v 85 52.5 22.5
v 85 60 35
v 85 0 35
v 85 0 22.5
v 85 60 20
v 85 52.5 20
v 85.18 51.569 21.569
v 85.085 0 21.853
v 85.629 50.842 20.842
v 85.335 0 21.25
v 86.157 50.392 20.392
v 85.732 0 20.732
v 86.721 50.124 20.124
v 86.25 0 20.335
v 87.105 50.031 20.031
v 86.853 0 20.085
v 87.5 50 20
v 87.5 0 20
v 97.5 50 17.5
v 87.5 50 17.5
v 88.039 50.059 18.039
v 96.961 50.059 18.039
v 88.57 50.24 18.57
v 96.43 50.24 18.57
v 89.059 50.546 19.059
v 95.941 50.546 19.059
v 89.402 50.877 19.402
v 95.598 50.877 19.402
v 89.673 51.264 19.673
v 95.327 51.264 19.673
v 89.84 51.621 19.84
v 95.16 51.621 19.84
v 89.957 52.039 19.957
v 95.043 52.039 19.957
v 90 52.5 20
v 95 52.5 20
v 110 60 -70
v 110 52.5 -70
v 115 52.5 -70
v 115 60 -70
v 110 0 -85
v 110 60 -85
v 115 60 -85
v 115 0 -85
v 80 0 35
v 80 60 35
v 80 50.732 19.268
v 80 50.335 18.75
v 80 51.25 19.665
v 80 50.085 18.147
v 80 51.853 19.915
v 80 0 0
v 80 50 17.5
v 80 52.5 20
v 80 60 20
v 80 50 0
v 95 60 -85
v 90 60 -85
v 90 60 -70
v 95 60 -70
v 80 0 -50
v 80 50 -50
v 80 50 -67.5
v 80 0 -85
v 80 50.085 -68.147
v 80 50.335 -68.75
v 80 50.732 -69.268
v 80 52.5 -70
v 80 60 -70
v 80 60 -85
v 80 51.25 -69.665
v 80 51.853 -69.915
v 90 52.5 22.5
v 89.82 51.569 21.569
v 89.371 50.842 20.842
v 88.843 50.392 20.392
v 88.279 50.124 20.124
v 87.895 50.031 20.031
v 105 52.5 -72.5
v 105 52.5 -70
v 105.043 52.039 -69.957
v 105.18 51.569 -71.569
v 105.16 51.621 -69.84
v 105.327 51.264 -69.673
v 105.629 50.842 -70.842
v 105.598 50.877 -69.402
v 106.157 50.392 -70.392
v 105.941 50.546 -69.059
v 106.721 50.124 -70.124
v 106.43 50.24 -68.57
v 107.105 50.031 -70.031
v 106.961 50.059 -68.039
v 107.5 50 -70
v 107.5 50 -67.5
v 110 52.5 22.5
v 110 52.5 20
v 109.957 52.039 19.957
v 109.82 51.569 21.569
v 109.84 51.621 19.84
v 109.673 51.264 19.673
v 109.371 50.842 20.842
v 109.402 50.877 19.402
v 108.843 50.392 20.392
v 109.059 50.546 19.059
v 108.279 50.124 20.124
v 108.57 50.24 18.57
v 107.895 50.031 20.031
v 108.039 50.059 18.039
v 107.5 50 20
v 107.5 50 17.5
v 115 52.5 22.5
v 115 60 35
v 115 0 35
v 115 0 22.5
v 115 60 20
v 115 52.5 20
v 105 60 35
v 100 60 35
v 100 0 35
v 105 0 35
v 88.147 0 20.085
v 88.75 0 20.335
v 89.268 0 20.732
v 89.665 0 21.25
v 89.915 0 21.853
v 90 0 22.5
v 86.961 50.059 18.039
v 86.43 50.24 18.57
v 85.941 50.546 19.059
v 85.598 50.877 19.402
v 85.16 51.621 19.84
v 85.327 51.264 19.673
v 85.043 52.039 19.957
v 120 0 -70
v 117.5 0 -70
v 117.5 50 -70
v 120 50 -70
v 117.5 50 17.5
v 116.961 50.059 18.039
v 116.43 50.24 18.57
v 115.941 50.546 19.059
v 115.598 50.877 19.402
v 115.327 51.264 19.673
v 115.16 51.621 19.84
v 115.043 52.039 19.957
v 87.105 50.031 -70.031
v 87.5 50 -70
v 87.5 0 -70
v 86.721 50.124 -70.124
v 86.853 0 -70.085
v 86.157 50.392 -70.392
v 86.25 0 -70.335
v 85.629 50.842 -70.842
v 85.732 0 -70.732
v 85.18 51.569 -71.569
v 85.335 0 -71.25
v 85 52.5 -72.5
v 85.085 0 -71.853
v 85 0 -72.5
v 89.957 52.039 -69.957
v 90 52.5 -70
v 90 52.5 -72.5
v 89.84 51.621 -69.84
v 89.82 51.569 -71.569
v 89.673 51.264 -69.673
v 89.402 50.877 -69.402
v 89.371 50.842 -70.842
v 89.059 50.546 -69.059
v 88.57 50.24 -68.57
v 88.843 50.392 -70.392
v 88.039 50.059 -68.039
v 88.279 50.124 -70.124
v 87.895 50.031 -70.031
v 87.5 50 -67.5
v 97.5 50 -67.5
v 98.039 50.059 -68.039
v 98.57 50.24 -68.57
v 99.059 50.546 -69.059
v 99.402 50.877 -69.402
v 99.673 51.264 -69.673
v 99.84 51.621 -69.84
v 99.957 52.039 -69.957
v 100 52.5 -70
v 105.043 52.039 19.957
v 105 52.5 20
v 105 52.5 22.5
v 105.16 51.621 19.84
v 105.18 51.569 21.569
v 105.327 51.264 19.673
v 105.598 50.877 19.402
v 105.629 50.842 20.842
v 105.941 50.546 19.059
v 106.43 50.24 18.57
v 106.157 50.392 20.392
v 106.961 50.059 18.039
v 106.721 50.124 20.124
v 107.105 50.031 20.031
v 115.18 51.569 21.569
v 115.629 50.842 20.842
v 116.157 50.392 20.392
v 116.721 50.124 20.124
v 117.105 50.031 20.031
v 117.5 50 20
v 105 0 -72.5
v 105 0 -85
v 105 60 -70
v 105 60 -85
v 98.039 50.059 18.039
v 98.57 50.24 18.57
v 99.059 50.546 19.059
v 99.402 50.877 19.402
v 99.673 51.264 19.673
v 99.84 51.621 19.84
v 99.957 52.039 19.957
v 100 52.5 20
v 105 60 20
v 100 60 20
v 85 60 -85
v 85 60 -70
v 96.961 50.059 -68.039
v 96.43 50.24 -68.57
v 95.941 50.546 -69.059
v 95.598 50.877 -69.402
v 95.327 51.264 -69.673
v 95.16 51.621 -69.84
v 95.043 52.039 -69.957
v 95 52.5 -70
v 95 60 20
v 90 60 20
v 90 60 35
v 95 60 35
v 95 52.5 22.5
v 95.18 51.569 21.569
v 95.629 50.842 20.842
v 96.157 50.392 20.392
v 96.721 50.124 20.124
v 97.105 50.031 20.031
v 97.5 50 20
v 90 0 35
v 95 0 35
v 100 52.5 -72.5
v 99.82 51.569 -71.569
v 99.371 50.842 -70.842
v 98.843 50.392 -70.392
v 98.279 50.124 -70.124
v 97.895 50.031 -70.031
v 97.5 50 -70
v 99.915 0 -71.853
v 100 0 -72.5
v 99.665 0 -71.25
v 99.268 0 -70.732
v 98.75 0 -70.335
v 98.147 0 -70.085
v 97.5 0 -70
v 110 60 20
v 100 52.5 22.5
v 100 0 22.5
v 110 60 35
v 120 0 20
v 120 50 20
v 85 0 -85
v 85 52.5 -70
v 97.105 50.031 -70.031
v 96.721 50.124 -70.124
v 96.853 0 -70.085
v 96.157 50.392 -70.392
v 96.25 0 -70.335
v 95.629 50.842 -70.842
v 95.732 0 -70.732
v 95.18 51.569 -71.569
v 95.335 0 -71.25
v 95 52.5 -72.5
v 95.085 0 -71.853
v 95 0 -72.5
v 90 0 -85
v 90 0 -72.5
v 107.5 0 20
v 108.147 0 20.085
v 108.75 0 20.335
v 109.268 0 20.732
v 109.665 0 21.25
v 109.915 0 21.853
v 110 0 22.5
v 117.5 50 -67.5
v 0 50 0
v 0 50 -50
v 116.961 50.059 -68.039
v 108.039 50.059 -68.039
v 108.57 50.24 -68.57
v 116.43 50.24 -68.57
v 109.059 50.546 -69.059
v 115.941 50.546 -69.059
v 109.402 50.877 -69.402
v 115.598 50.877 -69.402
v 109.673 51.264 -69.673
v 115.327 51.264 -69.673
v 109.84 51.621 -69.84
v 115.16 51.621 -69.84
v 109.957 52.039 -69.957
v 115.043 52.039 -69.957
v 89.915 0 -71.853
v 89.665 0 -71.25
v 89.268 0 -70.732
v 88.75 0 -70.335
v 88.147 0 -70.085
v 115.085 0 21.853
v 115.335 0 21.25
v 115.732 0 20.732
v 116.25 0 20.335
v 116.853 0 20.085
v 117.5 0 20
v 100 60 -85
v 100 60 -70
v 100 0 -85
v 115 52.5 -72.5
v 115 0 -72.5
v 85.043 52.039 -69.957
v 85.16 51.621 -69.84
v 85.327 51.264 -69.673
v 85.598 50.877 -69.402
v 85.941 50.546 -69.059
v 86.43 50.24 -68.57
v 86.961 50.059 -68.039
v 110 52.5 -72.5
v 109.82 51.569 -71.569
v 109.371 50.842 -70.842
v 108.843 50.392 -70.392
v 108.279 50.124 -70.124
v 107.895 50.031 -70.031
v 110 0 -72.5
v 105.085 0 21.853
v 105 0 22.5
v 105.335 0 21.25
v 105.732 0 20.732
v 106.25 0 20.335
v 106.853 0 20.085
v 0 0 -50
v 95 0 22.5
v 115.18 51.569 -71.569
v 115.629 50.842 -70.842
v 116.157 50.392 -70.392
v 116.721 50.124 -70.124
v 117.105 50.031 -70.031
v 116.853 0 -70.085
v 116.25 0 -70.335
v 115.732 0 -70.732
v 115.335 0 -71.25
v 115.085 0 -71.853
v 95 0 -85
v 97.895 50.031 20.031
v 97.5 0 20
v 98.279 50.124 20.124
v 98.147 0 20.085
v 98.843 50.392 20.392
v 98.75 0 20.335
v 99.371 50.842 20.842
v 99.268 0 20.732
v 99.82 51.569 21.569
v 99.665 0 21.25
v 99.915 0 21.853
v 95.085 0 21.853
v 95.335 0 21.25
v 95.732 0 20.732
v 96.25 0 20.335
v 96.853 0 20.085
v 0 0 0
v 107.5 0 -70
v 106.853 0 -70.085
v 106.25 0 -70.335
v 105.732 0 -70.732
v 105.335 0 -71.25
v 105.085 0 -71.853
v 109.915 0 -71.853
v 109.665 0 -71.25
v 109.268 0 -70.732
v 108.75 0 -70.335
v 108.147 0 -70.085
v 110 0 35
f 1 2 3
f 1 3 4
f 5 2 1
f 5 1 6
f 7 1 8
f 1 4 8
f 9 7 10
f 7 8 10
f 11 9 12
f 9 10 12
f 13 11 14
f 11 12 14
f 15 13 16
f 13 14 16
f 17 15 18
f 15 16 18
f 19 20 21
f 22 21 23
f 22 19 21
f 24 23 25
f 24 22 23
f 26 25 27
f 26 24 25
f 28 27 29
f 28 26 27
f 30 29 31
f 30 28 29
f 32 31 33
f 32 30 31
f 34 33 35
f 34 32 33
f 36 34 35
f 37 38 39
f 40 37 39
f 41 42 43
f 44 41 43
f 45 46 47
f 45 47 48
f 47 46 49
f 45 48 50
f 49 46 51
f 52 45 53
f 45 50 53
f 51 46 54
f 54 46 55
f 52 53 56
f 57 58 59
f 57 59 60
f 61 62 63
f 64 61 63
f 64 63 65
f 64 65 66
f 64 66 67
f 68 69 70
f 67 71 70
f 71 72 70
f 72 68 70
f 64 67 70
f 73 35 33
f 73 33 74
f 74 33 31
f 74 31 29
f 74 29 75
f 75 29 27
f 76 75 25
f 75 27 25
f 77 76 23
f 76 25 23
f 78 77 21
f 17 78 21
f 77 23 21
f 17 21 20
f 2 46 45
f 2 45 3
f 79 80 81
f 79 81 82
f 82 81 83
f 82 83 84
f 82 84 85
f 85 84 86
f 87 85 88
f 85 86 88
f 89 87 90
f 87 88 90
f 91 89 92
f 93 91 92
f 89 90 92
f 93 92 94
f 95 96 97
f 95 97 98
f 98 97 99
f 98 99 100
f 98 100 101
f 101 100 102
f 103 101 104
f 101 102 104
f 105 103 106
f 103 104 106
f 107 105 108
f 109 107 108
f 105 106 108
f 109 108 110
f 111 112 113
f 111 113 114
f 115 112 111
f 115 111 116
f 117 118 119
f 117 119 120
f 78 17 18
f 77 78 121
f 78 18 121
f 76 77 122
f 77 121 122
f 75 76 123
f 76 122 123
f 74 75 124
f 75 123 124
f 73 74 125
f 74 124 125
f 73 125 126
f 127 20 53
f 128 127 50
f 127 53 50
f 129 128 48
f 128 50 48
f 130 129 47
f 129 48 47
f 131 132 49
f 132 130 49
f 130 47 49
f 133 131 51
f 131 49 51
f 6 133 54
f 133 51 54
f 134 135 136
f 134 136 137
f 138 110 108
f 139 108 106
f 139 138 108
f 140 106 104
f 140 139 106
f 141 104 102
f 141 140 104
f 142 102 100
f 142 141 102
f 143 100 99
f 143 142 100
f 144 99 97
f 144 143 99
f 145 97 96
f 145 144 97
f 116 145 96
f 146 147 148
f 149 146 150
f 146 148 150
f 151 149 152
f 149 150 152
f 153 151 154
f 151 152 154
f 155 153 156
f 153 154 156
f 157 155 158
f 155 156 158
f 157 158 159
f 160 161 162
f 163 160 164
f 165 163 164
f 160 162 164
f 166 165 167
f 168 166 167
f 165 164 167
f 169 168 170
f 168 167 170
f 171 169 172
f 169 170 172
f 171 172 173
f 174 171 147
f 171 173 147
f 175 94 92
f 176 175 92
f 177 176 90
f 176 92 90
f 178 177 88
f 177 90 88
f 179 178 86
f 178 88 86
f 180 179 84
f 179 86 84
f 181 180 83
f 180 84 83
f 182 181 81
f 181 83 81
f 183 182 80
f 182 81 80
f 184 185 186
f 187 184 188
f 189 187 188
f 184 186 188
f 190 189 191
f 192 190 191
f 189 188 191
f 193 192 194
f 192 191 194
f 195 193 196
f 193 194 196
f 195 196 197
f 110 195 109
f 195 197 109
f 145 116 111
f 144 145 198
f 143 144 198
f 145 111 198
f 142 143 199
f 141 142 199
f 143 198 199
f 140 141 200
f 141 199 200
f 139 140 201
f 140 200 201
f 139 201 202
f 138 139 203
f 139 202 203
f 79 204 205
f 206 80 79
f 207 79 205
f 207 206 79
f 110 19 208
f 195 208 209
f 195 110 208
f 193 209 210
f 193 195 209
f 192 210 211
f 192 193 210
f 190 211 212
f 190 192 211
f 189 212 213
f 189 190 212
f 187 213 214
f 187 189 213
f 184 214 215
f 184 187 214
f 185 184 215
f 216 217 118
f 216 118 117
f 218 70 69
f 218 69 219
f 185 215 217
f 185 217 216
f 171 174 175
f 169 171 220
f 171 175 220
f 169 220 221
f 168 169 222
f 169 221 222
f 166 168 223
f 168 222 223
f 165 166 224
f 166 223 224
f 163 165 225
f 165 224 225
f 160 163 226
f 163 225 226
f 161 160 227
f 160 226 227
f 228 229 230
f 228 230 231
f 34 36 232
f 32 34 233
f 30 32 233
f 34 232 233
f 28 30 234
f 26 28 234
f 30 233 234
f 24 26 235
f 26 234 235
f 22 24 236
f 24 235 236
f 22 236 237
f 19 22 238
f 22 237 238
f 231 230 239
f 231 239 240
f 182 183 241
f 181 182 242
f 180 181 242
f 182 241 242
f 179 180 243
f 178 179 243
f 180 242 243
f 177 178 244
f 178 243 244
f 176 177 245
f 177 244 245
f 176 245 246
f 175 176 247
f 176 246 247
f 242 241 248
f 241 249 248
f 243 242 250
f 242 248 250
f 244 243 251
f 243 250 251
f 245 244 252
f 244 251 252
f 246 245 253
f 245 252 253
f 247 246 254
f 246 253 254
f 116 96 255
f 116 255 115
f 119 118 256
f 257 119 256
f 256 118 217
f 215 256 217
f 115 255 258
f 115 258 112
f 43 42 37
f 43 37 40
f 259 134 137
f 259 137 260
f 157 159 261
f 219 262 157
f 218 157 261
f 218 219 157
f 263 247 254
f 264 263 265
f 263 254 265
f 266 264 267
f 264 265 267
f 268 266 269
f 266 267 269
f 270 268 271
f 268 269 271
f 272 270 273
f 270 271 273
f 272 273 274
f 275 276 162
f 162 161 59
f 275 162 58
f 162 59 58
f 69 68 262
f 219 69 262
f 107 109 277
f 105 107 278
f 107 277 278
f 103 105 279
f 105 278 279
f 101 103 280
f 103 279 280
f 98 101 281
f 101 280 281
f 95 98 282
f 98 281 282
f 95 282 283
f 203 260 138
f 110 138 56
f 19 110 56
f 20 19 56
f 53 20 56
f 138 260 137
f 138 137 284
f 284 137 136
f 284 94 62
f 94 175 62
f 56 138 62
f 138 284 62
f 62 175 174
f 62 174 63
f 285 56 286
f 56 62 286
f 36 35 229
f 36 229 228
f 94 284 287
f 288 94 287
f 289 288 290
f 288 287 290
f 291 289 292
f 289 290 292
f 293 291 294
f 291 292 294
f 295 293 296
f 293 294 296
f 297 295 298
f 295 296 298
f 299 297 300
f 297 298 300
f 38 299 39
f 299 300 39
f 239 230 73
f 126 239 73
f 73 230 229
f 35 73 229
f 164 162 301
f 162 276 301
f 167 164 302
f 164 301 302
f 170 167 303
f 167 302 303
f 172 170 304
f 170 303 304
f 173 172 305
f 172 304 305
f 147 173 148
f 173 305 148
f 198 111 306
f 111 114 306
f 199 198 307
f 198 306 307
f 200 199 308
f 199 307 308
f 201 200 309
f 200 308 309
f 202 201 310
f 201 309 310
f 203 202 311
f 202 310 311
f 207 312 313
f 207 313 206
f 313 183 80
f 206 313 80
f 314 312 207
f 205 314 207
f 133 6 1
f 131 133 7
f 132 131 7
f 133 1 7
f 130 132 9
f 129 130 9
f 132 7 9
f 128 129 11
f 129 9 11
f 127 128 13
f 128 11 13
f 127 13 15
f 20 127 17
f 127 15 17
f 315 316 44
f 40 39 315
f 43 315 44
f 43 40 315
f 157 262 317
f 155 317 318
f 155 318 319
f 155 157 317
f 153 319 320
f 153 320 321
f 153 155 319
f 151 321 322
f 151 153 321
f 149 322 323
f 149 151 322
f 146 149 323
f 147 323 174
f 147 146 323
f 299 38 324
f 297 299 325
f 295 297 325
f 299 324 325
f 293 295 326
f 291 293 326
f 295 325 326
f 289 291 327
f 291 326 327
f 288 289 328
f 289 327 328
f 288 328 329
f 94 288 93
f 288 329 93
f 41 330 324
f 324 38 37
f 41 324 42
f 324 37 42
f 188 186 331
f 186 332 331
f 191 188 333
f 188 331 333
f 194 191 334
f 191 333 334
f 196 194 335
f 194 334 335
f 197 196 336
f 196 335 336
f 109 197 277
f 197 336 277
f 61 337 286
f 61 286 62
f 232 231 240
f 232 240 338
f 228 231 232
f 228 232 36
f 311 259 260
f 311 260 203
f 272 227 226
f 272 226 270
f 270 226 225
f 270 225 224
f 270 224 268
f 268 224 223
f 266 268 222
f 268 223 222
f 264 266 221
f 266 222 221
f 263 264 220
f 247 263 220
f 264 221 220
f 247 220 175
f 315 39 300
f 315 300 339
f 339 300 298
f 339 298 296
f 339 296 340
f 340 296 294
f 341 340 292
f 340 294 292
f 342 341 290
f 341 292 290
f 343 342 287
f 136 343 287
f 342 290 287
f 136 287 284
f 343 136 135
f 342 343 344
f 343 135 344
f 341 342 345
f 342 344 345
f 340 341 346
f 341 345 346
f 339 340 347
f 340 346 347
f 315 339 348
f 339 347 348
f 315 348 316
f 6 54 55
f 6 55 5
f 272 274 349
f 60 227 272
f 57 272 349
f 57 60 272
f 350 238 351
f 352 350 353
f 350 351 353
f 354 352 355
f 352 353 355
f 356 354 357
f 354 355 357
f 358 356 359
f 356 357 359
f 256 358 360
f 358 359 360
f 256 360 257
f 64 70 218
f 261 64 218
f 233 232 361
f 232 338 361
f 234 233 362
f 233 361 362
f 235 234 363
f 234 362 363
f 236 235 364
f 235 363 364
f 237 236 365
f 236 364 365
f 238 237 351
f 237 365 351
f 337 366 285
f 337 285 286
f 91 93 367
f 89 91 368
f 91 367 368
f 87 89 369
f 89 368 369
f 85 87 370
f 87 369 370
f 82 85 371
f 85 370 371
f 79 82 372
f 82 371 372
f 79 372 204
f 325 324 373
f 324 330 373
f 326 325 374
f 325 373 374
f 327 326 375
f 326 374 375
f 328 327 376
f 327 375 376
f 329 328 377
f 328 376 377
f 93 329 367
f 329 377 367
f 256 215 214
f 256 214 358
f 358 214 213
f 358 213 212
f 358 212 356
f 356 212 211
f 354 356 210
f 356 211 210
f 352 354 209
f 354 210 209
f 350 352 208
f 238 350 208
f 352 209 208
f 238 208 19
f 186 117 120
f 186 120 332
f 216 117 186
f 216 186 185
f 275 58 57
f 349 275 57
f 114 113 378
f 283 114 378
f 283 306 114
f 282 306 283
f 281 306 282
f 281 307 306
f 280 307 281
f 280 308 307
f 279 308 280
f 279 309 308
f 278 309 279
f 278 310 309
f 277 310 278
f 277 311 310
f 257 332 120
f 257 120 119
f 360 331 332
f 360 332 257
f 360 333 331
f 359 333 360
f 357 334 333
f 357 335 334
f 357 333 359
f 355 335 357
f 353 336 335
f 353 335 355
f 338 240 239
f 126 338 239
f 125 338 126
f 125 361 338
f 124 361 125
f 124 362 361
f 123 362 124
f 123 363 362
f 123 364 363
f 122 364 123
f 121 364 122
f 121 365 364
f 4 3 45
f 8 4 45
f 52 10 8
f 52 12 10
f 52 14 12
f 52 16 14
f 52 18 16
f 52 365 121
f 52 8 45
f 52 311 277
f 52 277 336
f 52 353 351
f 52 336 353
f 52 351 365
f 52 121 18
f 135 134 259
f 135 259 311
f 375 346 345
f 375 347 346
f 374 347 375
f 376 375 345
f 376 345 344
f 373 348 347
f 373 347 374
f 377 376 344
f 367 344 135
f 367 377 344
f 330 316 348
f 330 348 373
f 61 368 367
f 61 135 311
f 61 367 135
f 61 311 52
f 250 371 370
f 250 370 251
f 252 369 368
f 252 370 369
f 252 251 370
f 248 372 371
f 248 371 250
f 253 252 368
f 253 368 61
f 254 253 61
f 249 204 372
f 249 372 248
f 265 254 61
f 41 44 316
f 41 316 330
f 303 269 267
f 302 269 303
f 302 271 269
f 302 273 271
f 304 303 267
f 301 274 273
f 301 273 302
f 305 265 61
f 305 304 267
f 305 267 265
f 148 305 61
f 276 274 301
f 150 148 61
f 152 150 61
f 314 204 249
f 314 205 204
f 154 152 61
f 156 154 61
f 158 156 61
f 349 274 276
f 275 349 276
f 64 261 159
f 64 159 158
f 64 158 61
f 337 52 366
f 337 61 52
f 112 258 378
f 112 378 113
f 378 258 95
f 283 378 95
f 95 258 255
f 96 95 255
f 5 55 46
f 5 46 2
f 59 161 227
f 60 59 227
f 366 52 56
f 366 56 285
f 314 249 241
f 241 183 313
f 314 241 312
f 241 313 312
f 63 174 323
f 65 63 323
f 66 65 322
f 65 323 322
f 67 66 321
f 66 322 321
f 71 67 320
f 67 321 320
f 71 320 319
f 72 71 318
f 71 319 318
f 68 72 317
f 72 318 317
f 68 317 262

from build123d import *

# Parameters (mm, degrees)
BOSS_EXTRUDE1_DEPTH             = 50
SKETCH2_W                       = 5
SKETCH2_H                       = 15
BOSS_EXTRUDE2_DEPTH             = 10
BOSS_EXTRUDE2_DIRECTION_2_REACH = 149.648
FILLET1_R                       = 2.5
FILLET2_R                       = 2.5
FILLET4_R                       = 2.5


with BuildPart() as part:
    # Sketch1 → Boss-Extrude1 (new body)
    with BuildSketch(Plane(origin=(0, 0, 0), x_dir=(1, 0, 0), z_dir=(0, 1, 0))):
        Polygon((80, 50), (80, 70), (120, 70), (120, -20), (80, -20), (80, 0), (0, 0), (0, 50), align=None)
    extrude(amount=BOSS_EXTRUDE1_DEPTH)

    # Sketch2 → Boss-Extrude2 (add)
    with BuildSketch(Plane(origin=(0, 50, 0), x_dir=(1, 0, 0), z_dir=(0, 1, 0))):
        with Locations((82.5, -27.5)):
            Rectangle(SKETCH2_W, SKETCH2_H)
        with Locations((92.5, -27.5)):
            Rectangle(SKETCH2_W, SKETCH2_H)
        with Locations((102.5, -27.5)):
            Rectangle(SKETCH2_W, SKETCH2_H)
        with Locations((112.5, -27.5)):
            Rectangle(SKETCH2_W, SKETCH2_H)
        with Locations((112.5, 77.5)):
            Rectangle(SKETCH2_W, SKETCH2_H)
        with Locations((102.5, 77.5)):
            Rectangle(SKETCH2_W, SKETCH2_H)
        with Locations((92.5, 77.5)):
            Rectangle(SKETCH2_W, SKETCH2_H)
        with Locations((82.5, 77.5)):
            Rectangle(SKETCH2_W, SKETCH2_H)
    extrude(amount=BOSS_EXTRUDE2_DEPTH)

    # Boss-Extrude2 direction 2: up to this face of the body (flat: up to its plane)
    boss_extrude2_direction_2_end = Plane(part.part.faces().sort_by_distance((68.421052632, 0, -25))[0])
    # Sketch2 → Boss-Extrude2 direction 2 (add, up to the picked face)
    with BuildSketch(Plane(origin=(0, 50, 0), x_dir=(1, 0, 0), z_dir=(0, 1, 0)), mode=Mode.PRIVATE) as boss_extrude2_direction_2_sk1:
        with Locations((82.5, -27.5)):
            Rectangle(SKETCH2_W, SKETCH2_H)
    boss_extrude2_direction_2_tool1 = split(extrude(boss_extrude2_direction_2_sk1.sketch, amount=-BOSS_EXTRUDE2_DIRECTION_2_REACH, mode=Mode.PRIVATE), bisect_by=boss_extrude2_direction_2_end, keep=Keep.BOTH, mode=Mode.PRIVATE)
    # Sketch2 → Boss-Extrude2 direction 2 (add, up to the picked face)
    with BuildSketch(Plane(origin=(0, 50, 0), x_dir=(1, 0, 0), z_dir=(0, 1, 0)), mode=Mode.PRIVATE) as boss_extrude2_direction_2_sk2:
        with Locations((92.5, -27.5)):
            Rectangle(SKETCH2_W, SKETCH2_H)
    boss_extrude2_direction_2_tool2 = split(extrude(boss_extrude2_direction_2_sk2.sketch, amount=-BOSS_EXTRUDE2_DIRECTION_2_REACH, mode=Mode.PRIVATE), bisect_by=boss_extrude2_direction_2_end, keep=Keep.BOTH, mode=Mode.PRIVATE)
    # Sketch2 → Boss-Extrude2 direction 2 (add, up to the picked face)
    with BuildSketch(Plane(origin=(0, 50, 0), x_dir=(1, 0, 0), z_dir=(0, 1, 0)), mode=Mode.PRIVATE) as boss_extrude2_direction_2_sk3:
        with Locations((102.5, -27.5)):
            Rectangle(SKETCH2_W, SKETCH2_H)
    boss_extrude2_direction_2_tool3 = split(extrude(boss_extrude2_direction_2_sk3.sketch, amount=-BOSS_EXTRUDE2_DIRECTION_2_REACH, mode=Mode.PRIVATE), bisect_by=boss_extrude2_direction_2_end, keep=Keep.BOTH, mode=Mode.PRIVATE)
    # Sketch2 → Boss-Extrude2 direction 2 (add, up to the picked face)
    with BuildSketch(Plane(origin=(0, 50, 0), x_dir=(1, 0, 0), z_dir=(0, 1, 0)), mode=Mode.PRIVATE) as boss_extrude2_direction_2_sk4:
        with Locations((112.5, -27.5)):
            Rectangle(SKETCH2_W, SKETCH2_H)
    boss_extrude2_direction_2_tool4 = split(extrude(boss_extrude2_direction_2_sk4.sketch, amount=-BOSS_EXTRUDE2_DIRECTION_2_REACH, mode=Mode.PRIVATE), bisect_by=boss_extrude2_direction_2_end, keep=Keep.BOTH, mode=Mode.PRIVATE)
    # Sketch2 → Boss-Extrude2 direction 2 (add, up to the picked face)
    with BuildSketch(Plane(origin=(0, 50, 0), x_dir=(1, 0, 0), z_dir=(0, 1, 0)), mode=Mode.PRIVATE) as boss_extrude2_direction_2_sk5:
        with Locations((112.5, 77.5)):
            Rectangle(SKETCH2_W, SKETCH2_H)
    boss_extrude2_direction_2_tool5 = split(extrude(boss_extrude2_direction_2_sk5.sketch, amount=-BOSS_EXTRUDE2_DIRECTION_2_REACH, mode=Mode.PRIVATE), bisect_by=boss_extrude2_direction_2_end, keep=Keep.BOTH, mode=Mode.PRIVATE)
    # Sketch2 → Boss-Extrude2 direction 2 (add, up to the picked face)
    with BuildSketch(Plane(origin=(0, 50, 0), x_dir=(1, 0, 0), z_dir=(0, 1, 0)), mode=Mode.PRIVATE) as boss_extrude2_direction_2_sk6:
        with Locations((102.5, 77.5)):
            Rectangle(SKETCH2_W, SKETCH2_H)
    boss_extrude2_direction_2_tool6 = split(extrude(boss_extrude2_direction_2_sk6.sketch, amount=-BOSS_EXTRUDE2_DIRECTION_2_REACH, mode=Mode.PRIVATE), bisect_by=boss_extrude2_direction_2_end, keep=Keep.BOTH, mode=Mode.PRIVATE)
    # Sketch2 → Boss-Extrude2 direction 2 (add, up to the picked face)
    with BuildSketch(Plane(origin=(0, 50, 0), x_dir=(1, 0, 0), z_dir=(0, 1, 0)), mode=Mode.PRIVATE) as boss_extrude2_direction_2_sk7:
        with Locations((92.5, 77.5)):
            Rectangle(SKETCH2_W, SKETCH2_H)
    boss_extrude2_direction_2_tool7 = split(extrude(boss_extrude2_direction_2_sk7.sketch, amount=-BOSS_EXTRUDE2_DIRECTION_2_REACH, mode=Mode.PRIVATE), bisect_by=boss_extrude2_direction_2_end, keep=Keep.BOTH, mode=Mode.PRIVATE)
    # Sketch2 → Boss-Extrude2 direction 2 (add, up to the picked face)
    with BuildSketch(Plane(origin=(0, 50, 0), x_dir=(1, 0, 0), z_dir=(0, 1, 0)), mode=Mode.PRIVATE) as boss_extrude2_direction_2_sk8:
        with Locations((82.5, 77.5)):
            Rectangle(SKETCH2_W, SKETCH2_H)
    boss_extrude2_direction_2_tool8 = split(extrude(boss_extrude2_direction_2_sk8.sketch, amount=-BOSS_EXTRUDE2_DIRECTION_2_REACH, mode=Mode.PRIVATE), bisect_by=boss_extrude2_direction_2_end, keep=Keep.BOTH, mode=Mode.PRIVATE)
    add(boss_extrude2_direction_2_tool1.solids().sort_by(Axis((82.5, 50, 27.5), (0, -1, 0)))[0])
    add(boss_extrude2_direction_2_tool2.solids().sort_by(Axis((92.5, 50, 27.5), (0, -1, 0)))[0])
    add(boss_extrude2_direction_2_tool3.solids().sort_by(Axis((102.5, 50, 27.5), (0, -1, 0)))[0])
    add(boss_extrude2_direction_2_tool4.solids().sort_by(Axis((112.5, 50, 27.5), (0, -1, 0)))[0])
    add(boss_extrude2_direction_2_tool5.solids().sort_by(Axis((112.5, 50, -77.5), (0, -1, 0)))[0])
    add(boss_extrude2_direction_2_tool6.solids().sort_by(Axis((102.5, 50, -77.5), (0, -1, 0)))[0])
    add(boss_extrude2_direction_2_tool7.solids().sort_by(Axis((92.5, 50, -77.5), (0, -1, 0)))[0])
    add(boss_extrude2_direction_2_tool8.solids().sort_by(Axis((82.5, 50, -77.5), (0, -1, 0)))[0])

    # Fillet1
    fillet1_edges = [part.edges().sort_by_distance(p)[0] for p in [
        (85, 25, -70),
        (85, 25, 20),
        (115, 25, -70),
        (110, 25, -70),
        (95, 25, 20),
        (90, 25, 20),
        (105, 25, 20),
        (100, 25, 20),
        (115, 25, 20),
        (110, 25, 20),
        (105, 25, -70),
        (100, 25, -70),
        (95, 25, -70),
        (90, 25, -70),
    ]]
    fillet(fillet1_edges, radius=FILLET1_R - 0.0001)  # a hair under: the kernel refuses the full size

    # Fillet2
    fillet2_edges = [part.edges().sort_by_distance(p)[0] for p in [
        (82.5, 50, -70),
        (82.5, 50, 20),
        (112.5, 50, -70),
        (92.5, 50, 20),
        (102.5, 50, 20),
        (112.5, 50, 20),
        (102.5, 50, -70),
        (92.5, 50, -70),
    ]]
    fillet(fillet2_edges, radius=FILLET2_R)

    # Fillet4
    fillet4_edges = [part.edges().sort_by_distance(p)[0] for p in [
        (110, 50, -69.99995),
        (100, 50, -69.99995),
        (90, 50, -69.99995),
        (110, 50, 19.99995),
        (100, 50, 19.99995),
        (90, 50, 19.99995),
        (115, 50, -69.99995),
        (105, 50, -69.99995),
        (95, 50, -69.99995),
        (85, 50, -69.99995),
        (85, 50, 19.99995),
        (95, 50, 19.99995),
        (105, 50, 19.99995),
        (115, 50, 19.99995),
    ]]
    fillet(fillet4_edges, radius=FILLET4_R - 0.0001)  # a hair under: the kernel refuses the full size


solid = part.part
